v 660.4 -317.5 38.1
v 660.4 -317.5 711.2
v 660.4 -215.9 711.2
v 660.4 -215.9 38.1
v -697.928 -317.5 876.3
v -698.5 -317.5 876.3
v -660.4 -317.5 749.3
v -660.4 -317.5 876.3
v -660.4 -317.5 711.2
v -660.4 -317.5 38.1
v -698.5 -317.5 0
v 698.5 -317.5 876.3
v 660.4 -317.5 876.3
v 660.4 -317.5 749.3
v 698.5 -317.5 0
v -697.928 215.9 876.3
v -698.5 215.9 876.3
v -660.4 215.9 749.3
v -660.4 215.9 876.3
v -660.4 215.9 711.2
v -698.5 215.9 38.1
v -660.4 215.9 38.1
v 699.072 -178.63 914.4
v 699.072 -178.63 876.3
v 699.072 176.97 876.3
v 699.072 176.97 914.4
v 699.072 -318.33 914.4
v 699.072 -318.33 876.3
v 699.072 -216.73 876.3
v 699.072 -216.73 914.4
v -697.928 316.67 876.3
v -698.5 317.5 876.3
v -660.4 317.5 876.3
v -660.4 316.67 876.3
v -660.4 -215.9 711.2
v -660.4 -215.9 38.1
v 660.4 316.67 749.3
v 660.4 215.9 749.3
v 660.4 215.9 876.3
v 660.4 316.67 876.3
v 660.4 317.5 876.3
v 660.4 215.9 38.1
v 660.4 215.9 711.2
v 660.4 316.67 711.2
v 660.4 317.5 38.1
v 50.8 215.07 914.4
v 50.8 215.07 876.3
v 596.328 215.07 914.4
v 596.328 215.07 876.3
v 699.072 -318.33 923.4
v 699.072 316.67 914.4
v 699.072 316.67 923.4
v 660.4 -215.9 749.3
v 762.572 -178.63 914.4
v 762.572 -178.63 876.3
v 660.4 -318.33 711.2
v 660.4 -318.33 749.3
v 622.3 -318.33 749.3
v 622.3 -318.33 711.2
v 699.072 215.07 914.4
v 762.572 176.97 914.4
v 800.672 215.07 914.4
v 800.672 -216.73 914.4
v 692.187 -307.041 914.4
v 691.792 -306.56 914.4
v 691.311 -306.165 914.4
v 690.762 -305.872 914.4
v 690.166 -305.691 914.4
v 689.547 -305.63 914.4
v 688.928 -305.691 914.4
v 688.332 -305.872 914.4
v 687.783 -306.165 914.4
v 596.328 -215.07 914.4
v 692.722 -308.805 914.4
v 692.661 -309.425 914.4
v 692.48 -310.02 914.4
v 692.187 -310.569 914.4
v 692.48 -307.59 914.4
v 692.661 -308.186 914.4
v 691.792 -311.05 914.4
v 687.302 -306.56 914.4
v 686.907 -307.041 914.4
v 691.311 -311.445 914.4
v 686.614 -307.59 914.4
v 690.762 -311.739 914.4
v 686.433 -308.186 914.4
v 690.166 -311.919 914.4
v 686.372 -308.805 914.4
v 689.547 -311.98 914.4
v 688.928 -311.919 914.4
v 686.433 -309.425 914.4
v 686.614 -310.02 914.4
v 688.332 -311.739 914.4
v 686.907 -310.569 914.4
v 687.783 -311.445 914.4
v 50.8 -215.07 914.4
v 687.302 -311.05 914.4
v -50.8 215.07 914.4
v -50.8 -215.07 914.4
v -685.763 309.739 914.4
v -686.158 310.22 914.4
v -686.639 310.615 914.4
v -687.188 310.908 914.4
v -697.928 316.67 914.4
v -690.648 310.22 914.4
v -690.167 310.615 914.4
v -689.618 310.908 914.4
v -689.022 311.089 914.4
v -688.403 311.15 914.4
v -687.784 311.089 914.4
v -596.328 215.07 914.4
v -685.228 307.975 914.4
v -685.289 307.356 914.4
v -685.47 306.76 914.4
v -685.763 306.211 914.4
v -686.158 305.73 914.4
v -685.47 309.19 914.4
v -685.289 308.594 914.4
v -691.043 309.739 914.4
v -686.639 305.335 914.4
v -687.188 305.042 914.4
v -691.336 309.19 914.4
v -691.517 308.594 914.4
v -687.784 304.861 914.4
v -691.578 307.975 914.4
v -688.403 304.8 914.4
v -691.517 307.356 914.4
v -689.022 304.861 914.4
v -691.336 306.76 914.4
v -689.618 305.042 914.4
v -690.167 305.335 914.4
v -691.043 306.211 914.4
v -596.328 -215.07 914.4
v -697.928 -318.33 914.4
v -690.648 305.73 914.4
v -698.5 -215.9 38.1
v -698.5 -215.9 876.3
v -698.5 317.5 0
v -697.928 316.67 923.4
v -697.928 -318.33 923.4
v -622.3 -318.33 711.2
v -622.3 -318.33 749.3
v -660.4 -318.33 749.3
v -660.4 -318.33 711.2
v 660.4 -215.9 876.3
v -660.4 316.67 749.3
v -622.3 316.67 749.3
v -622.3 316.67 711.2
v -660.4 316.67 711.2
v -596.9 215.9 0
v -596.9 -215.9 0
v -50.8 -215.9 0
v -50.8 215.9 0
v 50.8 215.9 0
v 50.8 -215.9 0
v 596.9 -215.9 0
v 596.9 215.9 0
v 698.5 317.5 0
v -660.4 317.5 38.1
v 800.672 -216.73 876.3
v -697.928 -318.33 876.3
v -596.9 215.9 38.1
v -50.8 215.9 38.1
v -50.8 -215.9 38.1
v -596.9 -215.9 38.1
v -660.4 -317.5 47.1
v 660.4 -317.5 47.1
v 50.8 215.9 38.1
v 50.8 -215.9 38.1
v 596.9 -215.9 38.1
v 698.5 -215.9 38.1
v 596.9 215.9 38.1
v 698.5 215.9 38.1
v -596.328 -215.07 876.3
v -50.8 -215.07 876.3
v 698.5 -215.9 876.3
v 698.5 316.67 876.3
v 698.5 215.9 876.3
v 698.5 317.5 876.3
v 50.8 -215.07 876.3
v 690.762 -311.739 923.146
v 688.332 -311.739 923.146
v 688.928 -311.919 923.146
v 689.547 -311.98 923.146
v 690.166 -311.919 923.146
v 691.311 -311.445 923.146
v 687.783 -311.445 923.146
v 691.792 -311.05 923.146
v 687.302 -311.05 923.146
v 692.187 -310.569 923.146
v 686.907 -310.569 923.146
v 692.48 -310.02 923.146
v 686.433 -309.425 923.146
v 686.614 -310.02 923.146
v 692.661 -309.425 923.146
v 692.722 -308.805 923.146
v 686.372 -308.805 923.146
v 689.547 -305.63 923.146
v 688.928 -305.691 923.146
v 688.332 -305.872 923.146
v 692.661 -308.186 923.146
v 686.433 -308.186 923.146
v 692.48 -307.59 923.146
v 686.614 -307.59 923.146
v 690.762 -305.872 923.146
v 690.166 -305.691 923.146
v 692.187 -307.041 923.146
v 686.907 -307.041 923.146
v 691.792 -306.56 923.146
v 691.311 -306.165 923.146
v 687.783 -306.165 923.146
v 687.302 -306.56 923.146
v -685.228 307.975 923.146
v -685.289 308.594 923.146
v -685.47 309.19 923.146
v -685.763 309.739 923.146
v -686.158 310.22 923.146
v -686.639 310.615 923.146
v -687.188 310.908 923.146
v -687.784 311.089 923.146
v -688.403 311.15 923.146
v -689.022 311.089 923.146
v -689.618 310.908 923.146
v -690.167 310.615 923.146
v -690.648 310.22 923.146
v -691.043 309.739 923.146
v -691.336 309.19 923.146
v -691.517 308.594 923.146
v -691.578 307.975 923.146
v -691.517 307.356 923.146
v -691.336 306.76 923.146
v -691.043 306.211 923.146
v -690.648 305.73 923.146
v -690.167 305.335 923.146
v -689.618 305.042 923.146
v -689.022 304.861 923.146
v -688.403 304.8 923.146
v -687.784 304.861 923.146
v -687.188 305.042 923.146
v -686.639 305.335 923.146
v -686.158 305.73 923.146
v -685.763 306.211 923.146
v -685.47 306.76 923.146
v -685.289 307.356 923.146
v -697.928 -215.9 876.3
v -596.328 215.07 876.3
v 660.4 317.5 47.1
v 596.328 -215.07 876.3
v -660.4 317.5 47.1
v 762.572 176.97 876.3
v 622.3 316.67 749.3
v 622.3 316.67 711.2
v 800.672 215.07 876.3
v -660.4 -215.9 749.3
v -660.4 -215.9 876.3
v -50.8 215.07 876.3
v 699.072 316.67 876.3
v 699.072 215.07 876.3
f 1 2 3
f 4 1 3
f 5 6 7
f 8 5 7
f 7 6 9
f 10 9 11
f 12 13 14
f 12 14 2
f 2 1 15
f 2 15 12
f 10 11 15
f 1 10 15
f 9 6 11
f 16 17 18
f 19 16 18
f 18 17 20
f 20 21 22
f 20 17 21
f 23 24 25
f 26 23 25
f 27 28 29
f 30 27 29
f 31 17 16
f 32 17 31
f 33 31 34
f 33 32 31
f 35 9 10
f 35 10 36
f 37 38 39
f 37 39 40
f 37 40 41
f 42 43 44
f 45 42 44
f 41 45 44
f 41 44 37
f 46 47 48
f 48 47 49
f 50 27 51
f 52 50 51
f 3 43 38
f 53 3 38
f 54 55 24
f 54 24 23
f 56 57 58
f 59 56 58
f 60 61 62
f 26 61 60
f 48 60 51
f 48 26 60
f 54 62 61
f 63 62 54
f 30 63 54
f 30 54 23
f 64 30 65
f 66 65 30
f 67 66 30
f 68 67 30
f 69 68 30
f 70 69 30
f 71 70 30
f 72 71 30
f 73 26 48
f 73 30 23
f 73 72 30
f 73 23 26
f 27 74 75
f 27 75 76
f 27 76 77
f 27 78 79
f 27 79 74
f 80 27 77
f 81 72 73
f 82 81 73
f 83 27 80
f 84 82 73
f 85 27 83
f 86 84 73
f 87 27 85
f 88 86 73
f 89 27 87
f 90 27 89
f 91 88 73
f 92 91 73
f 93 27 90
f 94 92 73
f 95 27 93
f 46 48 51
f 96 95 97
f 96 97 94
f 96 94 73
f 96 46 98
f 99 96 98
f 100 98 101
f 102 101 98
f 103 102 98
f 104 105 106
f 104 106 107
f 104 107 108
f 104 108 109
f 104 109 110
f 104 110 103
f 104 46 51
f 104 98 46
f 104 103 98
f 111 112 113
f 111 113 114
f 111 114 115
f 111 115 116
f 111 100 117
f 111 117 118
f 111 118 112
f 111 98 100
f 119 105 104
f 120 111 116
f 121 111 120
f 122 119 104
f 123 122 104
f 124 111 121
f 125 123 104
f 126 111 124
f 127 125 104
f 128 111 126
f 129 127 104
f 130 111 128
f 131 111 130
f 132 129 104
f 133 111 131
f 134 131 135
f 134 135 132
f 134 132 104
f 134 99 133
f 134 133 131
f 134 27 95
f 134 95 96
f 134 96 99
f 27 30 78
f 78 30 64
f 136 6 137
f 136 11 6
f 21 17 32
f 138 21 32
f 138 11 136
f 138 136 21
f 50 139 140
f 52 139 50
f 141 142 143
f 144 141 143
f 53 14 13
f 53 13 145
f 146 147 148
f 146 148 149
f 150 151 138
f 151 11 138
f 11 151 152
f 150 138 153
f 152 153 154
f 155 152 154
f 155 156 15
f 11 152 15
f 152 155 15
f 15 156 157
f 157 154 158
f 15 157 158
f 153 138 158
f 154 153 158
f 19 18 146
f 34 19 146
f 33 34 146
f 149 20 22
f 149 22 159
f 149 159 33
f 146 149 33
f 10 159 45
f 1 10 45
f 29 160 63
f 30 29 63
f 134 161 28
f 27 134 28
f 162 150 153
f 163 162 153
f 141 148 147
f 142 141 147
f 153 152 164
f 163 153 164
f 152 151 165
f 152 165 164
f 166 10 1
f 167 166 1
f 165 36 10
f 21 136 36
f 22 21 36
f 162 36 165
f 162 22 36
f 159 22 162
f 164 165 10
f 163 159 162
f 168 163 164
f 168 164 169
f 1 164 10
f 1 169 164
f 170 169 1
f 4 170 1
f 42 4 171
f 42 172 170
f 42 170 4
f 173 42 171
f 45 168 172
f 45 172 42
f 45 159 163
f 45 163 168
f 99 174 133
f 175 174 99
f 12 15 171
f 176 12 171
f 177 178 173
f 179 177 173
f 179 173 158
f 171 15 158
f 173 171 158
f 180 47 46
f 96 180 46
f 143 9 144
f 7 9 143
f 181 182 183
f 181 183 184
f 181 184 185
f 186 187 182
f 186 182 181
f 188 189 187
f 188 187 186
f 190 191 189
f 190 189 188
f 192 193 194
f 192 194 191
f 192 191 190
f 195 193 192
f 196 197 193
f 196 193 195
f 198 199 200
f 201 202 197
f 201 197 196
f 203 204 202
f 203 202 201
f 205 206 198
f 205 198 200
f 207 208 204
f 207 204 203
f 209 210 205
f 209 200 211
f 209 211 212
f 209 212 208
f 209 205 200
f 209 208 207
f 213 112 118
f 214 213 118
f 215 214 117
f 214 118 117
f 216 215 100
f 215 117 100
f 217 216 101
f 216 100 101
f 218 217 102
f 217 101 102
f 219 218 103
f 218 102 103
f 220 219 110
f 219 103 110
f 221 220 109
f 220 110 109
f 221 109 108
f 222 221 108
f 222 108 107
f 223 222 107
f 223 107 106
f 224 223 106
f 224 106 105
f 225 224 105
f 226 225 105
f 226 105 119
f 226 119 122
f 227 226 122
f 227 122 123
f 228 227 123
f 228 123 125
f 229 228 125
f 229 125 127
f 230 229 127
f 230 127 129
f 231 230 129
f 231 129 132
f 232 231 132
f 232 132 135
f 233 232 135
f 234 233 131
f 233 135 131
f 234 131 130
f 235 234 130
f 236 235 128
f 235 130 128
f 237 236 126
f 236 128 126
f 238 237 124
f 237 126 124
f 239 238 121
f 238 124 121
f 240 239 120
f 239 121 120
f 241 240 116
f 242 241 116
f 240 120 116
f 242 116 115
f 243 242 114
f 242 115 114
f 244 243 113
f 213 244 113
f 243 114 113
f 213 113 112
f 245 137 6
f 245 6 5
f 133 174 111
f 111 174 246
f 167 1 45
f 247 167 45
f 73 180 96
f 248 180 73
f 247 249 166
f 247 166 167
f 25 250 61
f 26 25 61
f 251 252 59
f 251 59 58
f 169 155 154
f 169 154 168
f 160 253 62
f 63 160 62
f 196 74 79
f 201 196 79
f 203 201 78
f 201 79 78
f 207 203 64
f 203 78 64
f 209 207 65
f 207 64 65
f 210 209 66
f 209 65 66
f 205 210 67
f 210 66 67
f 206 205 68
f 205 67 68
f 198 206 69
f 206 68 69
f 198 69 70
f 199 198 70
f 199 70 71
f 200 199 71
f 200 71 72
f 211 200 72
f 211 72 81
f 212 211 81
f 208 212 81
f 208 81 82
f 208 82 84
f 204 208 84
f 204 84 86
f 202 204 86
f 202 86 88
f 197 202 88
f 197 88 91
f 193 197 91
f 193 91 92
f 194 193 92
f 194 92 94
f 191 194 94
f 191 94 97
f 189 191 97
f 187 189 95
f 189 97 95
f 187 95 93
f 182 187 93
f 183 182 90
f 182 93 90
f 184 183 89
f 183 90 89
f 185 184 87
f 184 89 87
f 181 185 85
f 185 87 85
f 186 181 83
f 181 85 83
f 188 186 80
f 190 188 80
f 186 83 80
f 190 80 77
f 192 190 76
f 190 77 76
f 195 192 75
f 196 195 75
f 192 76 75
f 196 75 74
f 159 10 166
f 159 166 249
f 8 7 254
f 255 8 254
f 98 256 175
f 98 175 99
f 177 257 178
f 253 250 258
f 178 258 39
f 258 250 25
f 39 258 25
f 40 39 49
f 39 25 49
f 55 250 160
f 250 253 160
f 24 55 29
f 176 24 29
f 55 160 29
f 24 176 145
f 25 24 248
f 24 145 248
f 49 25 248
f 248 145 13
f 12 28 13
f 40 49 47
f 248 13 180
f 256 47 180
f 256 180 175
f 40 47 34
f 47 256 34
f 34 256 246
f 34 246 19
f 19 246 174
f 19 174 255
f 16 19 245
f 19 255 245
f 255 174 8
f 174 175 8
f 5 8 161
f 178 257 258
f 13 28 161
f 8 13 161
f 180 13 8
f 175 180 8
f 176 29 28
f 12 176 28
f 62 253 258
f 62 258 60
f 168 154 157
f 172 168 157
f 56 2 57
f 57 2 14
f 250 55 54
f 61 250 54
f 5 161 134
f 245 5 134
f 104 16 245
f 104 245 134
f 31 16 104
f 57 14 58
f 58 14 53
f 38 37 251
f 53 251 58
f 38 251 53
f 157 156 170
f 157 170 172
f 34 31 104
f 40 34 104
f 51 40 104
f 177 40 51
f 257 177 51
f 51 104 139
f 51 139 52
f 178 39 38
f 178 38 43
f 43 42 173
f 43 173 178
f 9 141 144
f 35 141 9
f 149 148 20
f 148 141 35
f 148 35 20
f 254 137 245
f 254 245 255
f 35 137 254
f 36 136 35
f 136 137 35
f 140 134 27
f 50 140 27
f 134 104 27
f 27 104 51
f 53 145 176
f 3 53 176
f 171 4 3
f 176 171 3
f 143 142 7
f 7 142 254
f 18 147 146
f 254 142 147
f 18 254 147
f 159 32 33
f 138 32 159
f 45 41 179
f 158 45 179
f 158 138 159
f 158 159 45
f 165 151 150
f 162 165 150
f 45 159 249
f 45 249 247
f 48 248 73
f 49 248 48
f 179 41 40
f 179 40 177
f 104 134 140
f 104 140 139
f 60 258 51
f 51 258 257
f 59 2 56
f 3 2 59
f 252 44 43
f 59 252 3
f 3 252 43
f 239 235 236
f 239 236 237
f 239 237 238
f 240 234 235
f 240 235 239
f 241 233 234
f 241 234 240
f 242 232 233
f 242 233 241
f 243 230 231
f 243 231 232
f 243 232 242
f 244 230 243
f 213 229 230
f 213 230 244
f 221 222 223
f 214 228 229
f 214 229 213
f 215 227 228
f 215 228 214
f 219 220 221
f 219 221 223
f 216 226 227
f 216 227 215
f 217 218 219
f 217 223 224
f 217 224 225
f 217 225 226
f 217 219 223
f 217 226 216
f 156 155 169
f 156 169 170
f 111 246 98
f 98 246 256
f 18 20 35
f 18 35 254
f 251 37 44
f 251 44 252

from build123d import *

# Parameters (mm, degrees)
F0_W      = 1397
F0_H      = 635
F0_W_2    = 1193.8
F0_H_2    = 431.8
F1_DEPTH  = 38.1
F2_W      = 38.1
F2_H      = 101.6
F3_DEPTH  = 838.2
F5_W      = 1397
F5_H      = 635
F5_W_2    = 1192.6560401917
F5_H_2    = 430.1391839981
F6_DEPTH  = 38.1
F7_W      = 101.6
F7_H      = 38.1
F8_DEPTH  = 431.8
F9_W      = 101.6
F9_H      = 38.1
F10_DEPTH = 431.8
F11_W     = 38.1
F11_H     = 38.1
F12_DEPTH = 101.6
F13_W     = 38.1
F13_H     = 38.1
F14_DEPTH = 358.14
F15_W     = 38.1
F15_H     = 38.1
F16_DEPTH = 635
F17_W     = 1320.8
F17_H     = 635
F18_DEPTH = 9
F19_W     = 1397
F19_H     = 635
F20_DEPTH = 9
F21_R     = 3.175
F22_DEPTH = 876.046


with BuildPart() as f1:
    # F0 (on Top) → F1 (new body)
    with BuildSketch(Plane.XY):
        Rectangle(F0_W, F0_H)
        Rectangle(F0_W_2, F0_H_2, mode=Mode.SUBTRACT)
    extrude(amount=F1_DEPTH)

    # F2 (on face) → F3 (join)
    with BuildSketch(Plane.XY.offset(38.1)):
        with Locations((-679.45, -266.7)):
            Rectangle(F2_W, F2_H)
        with Locations((-679.45, 266.7)):
            Rectangle(F2_W, F2_H)
        with Locations((679.45, 266.7)):
            Rectangle(F2_W, F2_H)
        with Locations((679.45, -266.7)):
            Rectangle(F2_W, F2_H)
    extrude(amount=F3_DEPTH)

    # F5 (on offset) → F6 (join)
    with BuildSketch(Plane.XY.offset(876.3)):
        with Locations((0.5719799042, -0.8304080009)):
            Rectangle(F5_W, F5_H)
        Rectangle(F5_W_2, F5_H_2, mode=Mode.SUBTRACT)
    extrude(amount=F6_DEPTH)

    # F7 (on face) → F8 (join)
    with BuildSketch(Plane.XZ.offset(-215.0695919991)):
        with Locations((0, 895.35)):
            Rectangle(F7_W, F7_H)
    extrude(amount=F8_DEPTH)

    # F9 (on face) → F10 (join)
    with BuildSketch(Plane(origin=(0, -215.9, 0), x_dir=(-1, 0, 0), z_dir=(0, 1, 0))):
        with Locations((0, 19.05)):
            Rectangle(F9_W, F9_H)
    extrude(amount=F10_DEPTH)

    # F11 (on face) → F12 (join)
    with BuildSketch(Plane.YZ.offset(699.0719799042)):
        with Locations((-197.6804080009, 895.35)):
            Rectangle(F11_W, F11_H)
        with Locations((196.0195919991, 895.35)):
            Rectangle(F11_W, F11_H)
    extrude(amount=F12_DEPTH)

    # F13 (on face) → F14 (join)
    with BuildSketch(Plane(origin=(0, -178.6304080009, 0), x_dir=(-1, 0, 0), z_dir=(0, 1, 0))):
        with Locations((-781.6219799042, 895.35)):
            Rectangle(F13_W, F13_H)
    extrude(amount=F14_DEPTH)

    # F15 (on face) → F16 (join)
    with BuildSketch(Plane(origin=(0, 316.6695919991, 0), x_dir=(-1, 0, 0), z_dir=(0, 1, 0))):
        with Locations((-641.35, 730.25)):
            Rectangle(F15_W, F15_H)
        with Locations((641.35, 730.25)):
            Rectangle(F15_W, F15_H)
    extrude(amount=-F16_DEPTH)

    # F21 (on face) → F22 (join)
    with BuildSketch(Plane.XY.offset(47.1)):
        with Locations((-688.4030200958, 307.975)):
            Circle(F21_R)
        with Locations((689.5469799042, -308.8054080009)):
            Circle(F21_R)
    extrude(amount=F22_DEPTH)


with BuildPart() as f18:
    # F17 (on face) → F18 (new body)
    with BuildSketch(Plane.XY.offset(38.1)):
        Rectangle(F17_W, F17_H)
    extrude(amount=F18_DEPTH)


with BuildPart() as f20:
    # F19 (on face) → F20 (new body)
    with BuildSketch(Plane.XY.offset(914.4)):
        with Locations((0.5719799042, -0.8304080009)):
            Rectangle(F19_W, F19_H)
    extrude(amount=F20_DEPTH)


solid = Compound([f1.part, f18.part, f20.part])
